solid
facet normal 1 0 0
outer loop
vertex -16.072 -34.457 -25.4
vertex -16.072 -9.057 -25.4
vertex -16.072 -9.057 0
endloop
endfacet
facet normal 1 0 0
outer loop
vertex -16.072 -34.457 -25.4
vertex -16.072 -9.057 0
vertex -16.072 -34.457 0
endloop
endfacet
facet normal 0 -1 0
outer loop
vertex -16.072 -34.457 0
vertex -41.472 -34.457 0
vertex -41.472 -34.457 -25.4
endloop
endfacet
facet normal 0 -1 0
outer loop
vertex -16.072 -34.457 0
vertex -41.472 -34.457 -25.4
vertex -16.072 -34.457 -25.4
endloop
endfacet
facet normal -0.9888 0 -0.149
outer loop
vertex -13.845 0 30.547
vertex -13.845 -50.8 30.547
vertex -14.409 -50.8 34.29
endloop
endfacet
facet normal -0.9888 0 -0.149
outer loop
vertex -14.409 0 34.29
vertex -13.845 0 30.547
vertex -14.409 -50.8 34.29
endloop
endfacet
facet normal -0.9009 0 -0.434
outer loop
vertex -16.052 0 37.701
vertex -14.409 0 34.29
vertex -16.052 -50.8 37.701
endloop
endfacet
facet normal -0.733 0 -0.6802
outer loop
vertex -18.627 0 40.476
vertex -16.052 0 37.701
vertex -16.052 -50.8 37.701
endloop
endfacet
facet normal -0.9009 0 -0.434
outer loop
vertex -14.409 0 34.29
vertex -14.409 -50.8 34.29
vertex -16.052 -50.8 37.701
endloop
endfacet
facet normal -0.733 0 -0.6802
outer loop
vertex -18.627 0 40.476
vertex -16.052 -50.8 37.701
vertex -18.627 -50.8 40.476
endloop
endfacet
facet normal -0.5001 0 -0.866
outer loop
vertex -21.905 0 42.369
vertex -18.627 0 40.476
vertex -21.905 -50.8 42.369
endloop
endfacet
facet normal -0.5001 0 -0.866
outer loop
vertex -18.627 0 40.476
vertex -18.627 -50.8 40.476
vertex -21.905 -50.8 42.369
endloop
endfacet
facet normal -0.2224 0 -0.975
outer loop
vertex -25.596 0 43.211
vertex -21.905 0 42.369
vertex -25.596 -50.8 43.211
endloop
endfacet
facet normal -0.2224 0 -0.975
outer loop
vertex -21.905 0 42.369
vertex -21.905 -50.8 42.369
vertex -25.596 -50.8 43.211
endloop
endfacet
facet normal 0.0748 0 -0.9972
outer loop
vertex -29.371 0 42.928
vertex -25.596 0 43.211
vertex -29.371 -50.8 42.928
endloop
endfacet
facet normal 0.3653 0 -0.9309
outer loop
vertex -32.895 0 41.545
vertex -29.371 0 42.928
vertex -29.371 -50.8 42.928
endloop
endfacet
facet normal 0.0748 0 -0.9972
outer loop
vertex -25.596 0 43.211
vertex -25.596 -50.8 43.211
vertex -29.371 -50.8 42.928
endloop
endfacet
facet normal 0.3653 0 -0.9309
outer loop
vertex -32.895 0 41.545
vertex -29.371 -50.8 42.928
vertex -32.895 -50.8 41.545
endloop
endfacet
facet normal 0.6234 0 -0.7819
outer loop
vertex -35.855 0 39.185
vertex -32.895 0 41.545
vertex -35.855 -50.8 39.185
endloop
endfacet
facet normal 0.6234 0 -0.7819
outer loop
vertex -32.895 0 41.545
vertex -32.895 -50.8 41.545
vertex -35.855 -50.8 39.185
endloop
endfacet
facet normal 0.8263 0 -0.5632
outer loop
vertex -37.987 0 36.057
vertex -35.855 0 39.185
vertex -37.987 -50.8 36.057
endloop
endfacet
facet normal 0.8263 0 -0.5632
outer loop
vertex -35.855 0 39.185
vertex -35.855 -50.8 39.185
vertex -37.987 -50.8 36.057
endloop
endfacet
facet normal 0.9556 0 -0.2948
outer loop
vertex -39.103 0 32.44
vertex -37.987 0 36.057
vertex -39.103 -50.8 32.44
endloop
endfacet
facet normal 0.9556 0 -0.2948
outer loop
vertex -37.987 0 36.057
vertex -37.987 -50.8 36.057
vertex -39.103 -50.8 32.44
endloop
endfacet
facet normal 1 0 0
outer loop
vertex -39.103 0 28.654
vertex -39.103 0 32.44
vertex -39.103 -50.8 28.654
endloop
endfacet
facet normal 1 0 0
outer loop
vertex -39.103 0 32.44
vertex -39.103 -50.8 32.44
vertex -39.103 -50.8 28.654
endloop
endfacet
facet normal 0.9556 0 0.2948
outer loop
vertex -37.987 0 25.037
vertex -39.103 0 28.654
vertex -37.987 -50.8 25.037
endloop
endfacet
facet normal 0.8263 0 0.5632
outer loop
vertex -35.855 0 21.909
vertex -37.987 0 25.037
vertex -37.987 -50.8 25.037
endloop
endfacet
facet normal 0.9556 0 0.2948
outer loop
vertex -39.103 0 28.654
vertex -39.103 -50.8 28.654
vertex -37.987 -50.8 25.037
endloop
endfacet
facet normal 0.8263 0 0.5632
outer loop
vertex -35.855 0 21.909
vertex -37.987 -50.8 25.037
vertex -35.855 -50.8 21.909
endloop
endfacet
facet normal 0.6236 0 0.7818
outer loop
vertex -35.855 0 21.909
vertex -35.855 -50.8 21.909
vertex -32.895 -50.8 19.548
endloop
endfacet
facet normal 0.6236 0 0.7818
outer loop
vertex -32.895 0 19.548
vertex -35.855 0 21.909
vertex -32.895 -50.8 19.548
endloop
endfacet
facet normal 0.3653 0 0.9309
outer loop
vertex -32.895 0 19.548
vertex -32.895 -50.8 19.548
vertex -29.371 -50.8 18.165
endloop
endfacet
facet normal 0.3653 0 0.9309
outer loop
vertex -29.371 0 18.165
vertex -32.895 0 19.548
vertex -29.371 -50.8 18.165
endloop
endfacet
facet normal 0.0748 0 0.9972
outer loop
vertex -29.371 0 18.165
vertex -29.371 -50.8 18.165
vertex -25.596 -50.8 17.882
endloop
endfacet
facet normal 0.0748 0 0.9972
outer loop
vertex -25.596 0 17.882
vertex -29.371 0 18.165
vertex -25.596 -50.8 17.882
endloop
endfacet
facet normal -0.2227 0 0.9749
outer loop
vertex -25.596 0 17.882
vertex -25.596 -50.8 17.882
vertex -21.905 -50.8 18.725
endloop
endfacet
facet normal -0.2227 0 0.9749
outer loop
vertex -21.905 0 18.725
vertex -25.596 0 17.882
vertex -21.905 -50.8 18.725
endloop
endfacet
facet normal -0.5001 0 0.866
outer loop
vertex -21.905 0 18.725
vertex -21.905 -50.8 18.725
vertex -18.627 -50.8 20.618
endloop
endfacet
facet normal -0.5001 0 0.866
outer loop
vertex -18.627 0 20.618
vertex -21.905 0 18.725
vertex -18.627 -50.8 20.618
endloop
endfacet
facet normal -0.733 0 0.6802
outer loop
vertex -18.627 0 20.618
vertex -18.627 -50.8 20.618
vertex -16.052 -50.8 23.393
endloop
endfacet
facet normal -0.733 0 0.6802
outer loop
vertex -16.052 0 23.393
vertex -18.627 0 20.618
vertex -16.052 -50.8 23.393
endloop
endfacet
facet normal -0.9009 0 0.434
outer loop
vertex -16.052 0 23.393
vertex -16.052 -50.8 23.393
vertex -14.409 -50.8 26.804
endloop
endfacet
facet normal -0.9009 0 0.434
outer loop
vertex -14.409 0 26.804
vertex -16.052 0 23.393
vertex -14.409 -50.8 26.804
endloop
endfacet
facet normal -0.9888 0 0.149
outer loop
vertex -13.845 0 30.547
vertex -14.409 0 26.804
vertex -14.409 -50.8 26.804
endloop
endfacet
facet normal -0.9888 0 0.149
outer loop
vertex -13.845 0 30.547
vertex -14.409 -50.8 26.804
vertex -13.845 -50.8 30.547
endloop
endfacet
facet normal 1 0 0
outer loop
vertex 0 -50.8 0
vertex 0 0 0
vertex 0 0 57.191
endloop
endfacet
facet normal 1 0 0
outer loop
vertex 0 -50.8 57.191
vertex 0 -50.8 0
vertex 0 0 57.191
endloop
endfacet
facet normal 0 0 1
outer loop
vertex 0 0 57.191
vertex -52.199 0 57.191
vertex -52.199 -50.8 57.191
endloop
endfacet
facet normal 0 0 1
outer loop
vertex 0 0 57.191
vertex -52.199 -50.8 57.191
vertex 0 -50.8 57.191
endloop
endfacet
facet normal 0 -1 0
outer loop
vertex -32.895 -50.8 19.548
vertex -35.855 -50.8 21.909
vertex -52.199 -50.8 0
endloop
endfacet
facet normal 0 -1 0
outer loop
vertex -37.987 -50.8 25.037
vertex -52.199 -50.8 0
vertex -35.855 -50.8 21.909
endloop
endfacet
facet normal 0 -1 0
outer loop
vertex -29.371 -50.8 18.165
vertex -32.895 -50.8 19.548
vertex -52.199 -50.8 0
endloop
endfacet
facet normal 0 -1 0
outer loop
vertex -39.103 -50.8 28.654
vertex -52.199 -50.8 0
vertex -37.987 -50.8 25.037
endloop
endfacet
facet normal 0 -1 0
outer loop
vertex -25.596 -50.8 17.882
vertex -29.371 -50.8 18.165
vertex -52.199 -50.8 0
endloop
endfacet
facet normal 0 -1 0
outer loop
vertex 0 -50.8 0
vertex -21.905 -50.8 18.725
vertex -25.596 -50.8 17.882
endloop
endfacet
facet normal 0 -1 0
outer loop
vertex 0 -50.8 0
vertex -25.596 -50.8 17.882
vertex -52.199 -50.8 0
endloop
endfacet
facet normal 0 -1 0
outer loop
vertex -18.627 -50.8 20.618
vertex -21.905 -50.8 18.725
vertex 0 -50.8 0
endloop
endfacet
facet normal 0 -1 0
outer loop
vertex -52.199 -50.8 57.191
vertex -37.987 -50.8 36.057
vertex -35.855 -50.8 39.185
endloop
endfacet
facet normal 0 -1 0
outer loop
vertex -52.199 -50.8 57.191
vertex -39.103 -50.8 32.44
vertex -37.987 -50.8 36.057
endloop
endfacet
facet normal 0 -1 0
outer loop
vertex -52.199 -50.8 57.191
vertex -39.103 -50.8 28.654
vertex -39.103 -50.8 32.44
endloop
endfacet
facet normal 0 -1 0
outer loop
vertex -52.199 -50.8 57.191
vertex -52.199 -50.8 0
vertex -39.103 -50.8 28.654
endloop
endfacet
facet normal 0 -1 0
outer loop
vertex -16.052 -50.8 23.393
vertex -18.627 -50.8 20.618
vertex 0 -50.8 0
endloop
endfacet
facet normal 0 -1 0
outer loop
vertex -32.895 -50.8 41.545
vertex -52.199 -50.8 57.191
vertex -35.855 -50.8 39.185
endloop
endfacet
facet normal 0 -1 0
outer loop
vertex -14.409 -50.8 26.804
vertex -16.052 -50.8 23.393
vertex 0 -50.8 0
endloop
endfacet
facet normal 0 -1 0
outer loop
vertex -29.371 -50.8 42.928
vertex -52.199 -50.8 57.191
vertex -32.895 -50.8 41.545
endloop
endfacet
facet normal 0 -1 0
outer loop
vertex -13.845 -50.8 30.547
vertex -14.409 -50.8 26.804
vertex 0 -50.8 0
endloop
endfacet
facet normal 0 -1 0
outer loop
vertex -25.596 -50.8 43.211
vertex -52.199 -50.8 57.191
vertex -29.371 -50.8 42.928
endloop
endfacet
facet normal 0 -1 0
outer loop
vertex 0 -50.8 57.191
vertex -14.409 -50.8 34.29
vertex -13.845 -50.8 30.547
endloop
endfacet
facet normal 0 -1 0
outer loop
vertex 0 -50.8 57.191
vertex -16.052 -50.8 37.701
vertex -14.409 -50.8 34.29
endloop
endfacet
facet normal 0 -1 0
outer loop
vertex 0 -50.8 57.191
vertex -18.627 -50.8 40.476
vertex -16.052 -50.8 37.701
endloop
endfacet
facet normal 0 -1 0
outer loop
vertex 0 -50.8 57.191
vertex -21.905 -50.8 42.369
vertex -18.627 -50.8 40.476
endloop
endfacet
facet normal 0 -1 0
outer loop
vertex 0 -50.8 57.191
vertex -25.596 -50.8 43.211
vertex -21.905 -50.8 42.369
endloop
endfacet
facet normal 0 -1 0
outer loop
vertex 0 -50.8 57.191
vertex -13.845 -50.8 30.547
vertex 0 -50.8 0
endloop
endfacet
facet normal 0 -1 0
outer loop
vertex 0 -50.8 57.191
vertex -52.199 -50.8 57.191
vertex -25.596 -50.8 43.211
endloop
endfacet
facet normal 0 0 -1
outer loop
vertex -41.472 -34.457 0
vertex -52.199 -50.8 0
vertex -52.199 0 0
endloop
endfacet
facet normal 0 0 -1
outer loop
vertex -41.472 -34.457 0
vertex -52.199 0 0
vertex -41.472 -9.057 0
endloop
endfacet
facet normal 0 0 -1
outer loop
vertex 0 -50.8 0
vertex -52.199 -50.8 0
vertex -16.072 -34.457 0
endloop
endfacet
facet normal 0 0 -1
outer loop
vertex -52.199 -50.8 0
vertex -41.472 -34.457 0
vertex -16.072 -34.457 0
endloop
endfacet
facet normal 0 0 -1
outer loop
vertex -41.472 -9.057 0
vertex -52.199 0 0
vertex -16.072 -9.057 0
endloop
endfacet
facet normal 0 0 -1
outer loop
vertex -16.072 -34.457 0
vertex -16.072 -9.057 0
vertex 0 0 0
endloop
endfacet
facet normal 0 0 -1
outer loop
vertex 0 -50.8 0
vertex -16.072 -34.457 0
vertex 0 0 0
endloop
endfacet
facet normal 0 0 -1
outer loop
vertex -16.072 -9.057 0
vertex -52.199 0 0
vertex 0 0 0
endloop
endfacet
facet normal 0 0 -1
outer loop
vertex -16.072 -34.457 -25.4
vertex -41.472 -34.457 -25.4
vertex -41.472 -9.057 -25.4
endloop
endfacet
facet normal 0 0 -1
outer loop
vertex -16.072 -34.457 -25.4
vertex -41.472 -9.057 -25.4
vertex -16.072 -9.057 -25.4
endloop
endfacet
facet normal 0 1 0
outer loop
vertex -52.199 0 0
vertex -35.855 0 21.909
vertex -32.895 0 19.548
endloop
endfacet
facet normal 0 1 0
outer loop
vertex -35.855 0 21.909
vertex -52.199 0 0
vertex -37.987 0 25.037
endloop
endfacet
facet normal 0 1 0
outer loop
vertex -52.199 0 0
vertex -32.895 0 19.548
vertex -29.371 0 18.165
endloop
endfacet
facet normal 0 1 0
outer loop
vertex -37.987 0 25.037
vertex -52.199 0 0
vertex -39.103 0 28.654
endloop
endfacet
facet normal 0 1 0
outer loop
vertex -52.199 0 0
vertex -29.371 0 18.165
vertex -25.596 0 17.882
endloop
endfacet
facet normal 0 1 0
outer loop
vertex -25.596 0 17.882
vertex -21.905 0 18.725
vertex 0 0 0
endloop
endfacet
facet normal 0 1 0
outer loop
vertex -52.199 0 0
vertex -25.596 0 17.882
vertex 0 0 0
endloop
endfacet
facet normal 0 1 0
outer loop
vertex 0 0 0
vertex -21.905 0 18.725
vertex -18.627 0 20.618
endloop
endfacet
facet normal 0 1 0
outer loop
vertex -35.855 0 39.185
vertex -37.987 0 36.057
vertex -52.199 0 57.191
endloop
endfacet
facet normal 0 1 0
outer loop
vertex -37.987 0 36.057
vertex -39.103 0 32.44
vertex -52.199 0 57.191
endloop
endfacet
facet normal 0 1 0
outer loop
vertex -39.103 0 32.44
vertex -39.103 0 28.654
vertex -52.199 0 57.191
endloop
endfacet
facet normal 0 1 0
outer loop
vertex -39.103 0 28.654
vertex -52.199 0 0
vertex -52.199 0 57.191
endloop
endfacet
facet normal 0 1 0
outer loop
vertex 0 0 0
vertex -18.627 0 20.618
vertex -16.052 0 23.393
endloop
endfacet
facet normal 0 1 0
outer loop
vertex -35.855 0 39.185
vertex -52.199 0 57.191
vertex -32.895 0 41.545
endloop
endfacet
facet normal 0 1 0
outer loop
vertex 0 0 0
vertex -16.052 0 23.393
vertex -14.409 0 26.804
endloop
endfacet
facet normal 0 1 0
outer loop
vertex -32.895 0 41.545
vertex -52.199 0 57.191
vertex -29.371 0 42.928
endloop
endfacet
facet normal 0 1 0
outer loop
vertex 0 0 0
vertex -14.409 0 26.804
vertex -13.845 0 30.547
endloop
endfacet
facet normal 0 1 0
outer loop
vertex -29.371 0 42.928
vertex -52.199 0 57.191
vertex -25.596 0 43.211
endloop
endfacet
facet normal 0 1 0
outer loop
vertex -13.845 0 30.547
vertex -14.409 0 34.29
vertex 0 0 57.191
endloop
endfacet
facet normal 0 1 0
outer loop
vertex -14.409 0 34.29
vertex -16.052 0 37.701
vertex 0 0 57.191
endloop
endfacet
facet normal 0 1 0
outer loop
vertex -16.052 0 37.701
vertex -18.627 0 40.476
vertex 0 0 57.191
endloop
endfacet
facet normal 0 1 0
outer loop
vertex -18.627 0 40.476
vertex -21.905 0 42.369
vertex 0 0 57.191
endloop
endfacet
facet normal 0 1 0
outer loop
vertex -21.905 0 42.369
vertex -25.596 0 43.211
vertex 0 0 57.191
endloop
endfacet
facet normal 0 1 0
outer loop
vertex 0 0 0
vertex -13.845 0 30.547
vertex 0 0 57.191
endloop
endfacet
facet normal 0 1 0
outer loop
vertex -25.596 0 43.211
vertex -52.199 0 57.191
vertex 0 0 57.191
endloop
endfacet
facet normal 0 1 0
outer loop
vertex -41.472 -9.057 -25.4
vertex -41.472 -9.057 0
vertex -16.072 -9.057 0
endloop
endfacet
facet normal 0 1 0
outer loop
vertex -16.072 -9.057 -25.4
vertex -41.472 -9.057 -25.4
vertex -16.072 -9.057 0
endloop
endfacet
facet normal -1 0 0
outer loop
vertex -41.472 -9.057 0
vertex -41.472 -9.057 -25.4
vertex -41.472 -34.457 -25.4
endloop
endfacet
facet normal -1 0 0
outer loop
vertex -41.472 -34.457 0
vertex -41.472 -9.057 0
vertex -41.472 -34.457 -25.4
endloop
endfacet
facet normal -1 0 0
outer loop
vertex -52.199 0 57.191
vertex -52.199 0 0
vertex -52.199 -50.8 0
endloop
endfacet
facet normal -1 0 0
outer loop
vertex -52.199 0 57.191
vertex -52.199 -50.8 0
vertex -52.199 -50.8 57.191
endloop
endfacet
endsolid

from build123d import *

# Parameters (mm, degrees)
F0_W     = 52.19904
F0_H     = 57.19075
F1_DEPTH = 50.8
F3_D     = 25.4
F4_W     = 25.4
F4_H     = 25.4
F5_DEPTH = 25.4


with BuildPart() as f1:
    # F0 (on Front) → F1 (new body)
    with BuildSketch(Plane.XZ):
        with Locations((-26.09952, 28.595375)):
            Rectangle(F0_W, F0_H)
    extrude(amount=F1_DEPTH)

    # F3 (through all)
    with Locations(Plane(origin=(0, 0, 0), x_dir=(-1, 0, 0), z_dir=(0, 1, 0))):
        with Locations((26.545139, 30.546911)):
            Hole(F3_D / 2)

    # F4 (on face) → F5 (join)
    with BuildSketch(Plane(origin=(0, 0, 0), x_dir=(1, 0, 0), z_dir=(0, 0, -1))):
        with Locations((-28.771738, 21.757494)):
            Rectangle(F4_W, F4_H)
    extrude(amount=F5_DEPTH)


solid = f1.part
